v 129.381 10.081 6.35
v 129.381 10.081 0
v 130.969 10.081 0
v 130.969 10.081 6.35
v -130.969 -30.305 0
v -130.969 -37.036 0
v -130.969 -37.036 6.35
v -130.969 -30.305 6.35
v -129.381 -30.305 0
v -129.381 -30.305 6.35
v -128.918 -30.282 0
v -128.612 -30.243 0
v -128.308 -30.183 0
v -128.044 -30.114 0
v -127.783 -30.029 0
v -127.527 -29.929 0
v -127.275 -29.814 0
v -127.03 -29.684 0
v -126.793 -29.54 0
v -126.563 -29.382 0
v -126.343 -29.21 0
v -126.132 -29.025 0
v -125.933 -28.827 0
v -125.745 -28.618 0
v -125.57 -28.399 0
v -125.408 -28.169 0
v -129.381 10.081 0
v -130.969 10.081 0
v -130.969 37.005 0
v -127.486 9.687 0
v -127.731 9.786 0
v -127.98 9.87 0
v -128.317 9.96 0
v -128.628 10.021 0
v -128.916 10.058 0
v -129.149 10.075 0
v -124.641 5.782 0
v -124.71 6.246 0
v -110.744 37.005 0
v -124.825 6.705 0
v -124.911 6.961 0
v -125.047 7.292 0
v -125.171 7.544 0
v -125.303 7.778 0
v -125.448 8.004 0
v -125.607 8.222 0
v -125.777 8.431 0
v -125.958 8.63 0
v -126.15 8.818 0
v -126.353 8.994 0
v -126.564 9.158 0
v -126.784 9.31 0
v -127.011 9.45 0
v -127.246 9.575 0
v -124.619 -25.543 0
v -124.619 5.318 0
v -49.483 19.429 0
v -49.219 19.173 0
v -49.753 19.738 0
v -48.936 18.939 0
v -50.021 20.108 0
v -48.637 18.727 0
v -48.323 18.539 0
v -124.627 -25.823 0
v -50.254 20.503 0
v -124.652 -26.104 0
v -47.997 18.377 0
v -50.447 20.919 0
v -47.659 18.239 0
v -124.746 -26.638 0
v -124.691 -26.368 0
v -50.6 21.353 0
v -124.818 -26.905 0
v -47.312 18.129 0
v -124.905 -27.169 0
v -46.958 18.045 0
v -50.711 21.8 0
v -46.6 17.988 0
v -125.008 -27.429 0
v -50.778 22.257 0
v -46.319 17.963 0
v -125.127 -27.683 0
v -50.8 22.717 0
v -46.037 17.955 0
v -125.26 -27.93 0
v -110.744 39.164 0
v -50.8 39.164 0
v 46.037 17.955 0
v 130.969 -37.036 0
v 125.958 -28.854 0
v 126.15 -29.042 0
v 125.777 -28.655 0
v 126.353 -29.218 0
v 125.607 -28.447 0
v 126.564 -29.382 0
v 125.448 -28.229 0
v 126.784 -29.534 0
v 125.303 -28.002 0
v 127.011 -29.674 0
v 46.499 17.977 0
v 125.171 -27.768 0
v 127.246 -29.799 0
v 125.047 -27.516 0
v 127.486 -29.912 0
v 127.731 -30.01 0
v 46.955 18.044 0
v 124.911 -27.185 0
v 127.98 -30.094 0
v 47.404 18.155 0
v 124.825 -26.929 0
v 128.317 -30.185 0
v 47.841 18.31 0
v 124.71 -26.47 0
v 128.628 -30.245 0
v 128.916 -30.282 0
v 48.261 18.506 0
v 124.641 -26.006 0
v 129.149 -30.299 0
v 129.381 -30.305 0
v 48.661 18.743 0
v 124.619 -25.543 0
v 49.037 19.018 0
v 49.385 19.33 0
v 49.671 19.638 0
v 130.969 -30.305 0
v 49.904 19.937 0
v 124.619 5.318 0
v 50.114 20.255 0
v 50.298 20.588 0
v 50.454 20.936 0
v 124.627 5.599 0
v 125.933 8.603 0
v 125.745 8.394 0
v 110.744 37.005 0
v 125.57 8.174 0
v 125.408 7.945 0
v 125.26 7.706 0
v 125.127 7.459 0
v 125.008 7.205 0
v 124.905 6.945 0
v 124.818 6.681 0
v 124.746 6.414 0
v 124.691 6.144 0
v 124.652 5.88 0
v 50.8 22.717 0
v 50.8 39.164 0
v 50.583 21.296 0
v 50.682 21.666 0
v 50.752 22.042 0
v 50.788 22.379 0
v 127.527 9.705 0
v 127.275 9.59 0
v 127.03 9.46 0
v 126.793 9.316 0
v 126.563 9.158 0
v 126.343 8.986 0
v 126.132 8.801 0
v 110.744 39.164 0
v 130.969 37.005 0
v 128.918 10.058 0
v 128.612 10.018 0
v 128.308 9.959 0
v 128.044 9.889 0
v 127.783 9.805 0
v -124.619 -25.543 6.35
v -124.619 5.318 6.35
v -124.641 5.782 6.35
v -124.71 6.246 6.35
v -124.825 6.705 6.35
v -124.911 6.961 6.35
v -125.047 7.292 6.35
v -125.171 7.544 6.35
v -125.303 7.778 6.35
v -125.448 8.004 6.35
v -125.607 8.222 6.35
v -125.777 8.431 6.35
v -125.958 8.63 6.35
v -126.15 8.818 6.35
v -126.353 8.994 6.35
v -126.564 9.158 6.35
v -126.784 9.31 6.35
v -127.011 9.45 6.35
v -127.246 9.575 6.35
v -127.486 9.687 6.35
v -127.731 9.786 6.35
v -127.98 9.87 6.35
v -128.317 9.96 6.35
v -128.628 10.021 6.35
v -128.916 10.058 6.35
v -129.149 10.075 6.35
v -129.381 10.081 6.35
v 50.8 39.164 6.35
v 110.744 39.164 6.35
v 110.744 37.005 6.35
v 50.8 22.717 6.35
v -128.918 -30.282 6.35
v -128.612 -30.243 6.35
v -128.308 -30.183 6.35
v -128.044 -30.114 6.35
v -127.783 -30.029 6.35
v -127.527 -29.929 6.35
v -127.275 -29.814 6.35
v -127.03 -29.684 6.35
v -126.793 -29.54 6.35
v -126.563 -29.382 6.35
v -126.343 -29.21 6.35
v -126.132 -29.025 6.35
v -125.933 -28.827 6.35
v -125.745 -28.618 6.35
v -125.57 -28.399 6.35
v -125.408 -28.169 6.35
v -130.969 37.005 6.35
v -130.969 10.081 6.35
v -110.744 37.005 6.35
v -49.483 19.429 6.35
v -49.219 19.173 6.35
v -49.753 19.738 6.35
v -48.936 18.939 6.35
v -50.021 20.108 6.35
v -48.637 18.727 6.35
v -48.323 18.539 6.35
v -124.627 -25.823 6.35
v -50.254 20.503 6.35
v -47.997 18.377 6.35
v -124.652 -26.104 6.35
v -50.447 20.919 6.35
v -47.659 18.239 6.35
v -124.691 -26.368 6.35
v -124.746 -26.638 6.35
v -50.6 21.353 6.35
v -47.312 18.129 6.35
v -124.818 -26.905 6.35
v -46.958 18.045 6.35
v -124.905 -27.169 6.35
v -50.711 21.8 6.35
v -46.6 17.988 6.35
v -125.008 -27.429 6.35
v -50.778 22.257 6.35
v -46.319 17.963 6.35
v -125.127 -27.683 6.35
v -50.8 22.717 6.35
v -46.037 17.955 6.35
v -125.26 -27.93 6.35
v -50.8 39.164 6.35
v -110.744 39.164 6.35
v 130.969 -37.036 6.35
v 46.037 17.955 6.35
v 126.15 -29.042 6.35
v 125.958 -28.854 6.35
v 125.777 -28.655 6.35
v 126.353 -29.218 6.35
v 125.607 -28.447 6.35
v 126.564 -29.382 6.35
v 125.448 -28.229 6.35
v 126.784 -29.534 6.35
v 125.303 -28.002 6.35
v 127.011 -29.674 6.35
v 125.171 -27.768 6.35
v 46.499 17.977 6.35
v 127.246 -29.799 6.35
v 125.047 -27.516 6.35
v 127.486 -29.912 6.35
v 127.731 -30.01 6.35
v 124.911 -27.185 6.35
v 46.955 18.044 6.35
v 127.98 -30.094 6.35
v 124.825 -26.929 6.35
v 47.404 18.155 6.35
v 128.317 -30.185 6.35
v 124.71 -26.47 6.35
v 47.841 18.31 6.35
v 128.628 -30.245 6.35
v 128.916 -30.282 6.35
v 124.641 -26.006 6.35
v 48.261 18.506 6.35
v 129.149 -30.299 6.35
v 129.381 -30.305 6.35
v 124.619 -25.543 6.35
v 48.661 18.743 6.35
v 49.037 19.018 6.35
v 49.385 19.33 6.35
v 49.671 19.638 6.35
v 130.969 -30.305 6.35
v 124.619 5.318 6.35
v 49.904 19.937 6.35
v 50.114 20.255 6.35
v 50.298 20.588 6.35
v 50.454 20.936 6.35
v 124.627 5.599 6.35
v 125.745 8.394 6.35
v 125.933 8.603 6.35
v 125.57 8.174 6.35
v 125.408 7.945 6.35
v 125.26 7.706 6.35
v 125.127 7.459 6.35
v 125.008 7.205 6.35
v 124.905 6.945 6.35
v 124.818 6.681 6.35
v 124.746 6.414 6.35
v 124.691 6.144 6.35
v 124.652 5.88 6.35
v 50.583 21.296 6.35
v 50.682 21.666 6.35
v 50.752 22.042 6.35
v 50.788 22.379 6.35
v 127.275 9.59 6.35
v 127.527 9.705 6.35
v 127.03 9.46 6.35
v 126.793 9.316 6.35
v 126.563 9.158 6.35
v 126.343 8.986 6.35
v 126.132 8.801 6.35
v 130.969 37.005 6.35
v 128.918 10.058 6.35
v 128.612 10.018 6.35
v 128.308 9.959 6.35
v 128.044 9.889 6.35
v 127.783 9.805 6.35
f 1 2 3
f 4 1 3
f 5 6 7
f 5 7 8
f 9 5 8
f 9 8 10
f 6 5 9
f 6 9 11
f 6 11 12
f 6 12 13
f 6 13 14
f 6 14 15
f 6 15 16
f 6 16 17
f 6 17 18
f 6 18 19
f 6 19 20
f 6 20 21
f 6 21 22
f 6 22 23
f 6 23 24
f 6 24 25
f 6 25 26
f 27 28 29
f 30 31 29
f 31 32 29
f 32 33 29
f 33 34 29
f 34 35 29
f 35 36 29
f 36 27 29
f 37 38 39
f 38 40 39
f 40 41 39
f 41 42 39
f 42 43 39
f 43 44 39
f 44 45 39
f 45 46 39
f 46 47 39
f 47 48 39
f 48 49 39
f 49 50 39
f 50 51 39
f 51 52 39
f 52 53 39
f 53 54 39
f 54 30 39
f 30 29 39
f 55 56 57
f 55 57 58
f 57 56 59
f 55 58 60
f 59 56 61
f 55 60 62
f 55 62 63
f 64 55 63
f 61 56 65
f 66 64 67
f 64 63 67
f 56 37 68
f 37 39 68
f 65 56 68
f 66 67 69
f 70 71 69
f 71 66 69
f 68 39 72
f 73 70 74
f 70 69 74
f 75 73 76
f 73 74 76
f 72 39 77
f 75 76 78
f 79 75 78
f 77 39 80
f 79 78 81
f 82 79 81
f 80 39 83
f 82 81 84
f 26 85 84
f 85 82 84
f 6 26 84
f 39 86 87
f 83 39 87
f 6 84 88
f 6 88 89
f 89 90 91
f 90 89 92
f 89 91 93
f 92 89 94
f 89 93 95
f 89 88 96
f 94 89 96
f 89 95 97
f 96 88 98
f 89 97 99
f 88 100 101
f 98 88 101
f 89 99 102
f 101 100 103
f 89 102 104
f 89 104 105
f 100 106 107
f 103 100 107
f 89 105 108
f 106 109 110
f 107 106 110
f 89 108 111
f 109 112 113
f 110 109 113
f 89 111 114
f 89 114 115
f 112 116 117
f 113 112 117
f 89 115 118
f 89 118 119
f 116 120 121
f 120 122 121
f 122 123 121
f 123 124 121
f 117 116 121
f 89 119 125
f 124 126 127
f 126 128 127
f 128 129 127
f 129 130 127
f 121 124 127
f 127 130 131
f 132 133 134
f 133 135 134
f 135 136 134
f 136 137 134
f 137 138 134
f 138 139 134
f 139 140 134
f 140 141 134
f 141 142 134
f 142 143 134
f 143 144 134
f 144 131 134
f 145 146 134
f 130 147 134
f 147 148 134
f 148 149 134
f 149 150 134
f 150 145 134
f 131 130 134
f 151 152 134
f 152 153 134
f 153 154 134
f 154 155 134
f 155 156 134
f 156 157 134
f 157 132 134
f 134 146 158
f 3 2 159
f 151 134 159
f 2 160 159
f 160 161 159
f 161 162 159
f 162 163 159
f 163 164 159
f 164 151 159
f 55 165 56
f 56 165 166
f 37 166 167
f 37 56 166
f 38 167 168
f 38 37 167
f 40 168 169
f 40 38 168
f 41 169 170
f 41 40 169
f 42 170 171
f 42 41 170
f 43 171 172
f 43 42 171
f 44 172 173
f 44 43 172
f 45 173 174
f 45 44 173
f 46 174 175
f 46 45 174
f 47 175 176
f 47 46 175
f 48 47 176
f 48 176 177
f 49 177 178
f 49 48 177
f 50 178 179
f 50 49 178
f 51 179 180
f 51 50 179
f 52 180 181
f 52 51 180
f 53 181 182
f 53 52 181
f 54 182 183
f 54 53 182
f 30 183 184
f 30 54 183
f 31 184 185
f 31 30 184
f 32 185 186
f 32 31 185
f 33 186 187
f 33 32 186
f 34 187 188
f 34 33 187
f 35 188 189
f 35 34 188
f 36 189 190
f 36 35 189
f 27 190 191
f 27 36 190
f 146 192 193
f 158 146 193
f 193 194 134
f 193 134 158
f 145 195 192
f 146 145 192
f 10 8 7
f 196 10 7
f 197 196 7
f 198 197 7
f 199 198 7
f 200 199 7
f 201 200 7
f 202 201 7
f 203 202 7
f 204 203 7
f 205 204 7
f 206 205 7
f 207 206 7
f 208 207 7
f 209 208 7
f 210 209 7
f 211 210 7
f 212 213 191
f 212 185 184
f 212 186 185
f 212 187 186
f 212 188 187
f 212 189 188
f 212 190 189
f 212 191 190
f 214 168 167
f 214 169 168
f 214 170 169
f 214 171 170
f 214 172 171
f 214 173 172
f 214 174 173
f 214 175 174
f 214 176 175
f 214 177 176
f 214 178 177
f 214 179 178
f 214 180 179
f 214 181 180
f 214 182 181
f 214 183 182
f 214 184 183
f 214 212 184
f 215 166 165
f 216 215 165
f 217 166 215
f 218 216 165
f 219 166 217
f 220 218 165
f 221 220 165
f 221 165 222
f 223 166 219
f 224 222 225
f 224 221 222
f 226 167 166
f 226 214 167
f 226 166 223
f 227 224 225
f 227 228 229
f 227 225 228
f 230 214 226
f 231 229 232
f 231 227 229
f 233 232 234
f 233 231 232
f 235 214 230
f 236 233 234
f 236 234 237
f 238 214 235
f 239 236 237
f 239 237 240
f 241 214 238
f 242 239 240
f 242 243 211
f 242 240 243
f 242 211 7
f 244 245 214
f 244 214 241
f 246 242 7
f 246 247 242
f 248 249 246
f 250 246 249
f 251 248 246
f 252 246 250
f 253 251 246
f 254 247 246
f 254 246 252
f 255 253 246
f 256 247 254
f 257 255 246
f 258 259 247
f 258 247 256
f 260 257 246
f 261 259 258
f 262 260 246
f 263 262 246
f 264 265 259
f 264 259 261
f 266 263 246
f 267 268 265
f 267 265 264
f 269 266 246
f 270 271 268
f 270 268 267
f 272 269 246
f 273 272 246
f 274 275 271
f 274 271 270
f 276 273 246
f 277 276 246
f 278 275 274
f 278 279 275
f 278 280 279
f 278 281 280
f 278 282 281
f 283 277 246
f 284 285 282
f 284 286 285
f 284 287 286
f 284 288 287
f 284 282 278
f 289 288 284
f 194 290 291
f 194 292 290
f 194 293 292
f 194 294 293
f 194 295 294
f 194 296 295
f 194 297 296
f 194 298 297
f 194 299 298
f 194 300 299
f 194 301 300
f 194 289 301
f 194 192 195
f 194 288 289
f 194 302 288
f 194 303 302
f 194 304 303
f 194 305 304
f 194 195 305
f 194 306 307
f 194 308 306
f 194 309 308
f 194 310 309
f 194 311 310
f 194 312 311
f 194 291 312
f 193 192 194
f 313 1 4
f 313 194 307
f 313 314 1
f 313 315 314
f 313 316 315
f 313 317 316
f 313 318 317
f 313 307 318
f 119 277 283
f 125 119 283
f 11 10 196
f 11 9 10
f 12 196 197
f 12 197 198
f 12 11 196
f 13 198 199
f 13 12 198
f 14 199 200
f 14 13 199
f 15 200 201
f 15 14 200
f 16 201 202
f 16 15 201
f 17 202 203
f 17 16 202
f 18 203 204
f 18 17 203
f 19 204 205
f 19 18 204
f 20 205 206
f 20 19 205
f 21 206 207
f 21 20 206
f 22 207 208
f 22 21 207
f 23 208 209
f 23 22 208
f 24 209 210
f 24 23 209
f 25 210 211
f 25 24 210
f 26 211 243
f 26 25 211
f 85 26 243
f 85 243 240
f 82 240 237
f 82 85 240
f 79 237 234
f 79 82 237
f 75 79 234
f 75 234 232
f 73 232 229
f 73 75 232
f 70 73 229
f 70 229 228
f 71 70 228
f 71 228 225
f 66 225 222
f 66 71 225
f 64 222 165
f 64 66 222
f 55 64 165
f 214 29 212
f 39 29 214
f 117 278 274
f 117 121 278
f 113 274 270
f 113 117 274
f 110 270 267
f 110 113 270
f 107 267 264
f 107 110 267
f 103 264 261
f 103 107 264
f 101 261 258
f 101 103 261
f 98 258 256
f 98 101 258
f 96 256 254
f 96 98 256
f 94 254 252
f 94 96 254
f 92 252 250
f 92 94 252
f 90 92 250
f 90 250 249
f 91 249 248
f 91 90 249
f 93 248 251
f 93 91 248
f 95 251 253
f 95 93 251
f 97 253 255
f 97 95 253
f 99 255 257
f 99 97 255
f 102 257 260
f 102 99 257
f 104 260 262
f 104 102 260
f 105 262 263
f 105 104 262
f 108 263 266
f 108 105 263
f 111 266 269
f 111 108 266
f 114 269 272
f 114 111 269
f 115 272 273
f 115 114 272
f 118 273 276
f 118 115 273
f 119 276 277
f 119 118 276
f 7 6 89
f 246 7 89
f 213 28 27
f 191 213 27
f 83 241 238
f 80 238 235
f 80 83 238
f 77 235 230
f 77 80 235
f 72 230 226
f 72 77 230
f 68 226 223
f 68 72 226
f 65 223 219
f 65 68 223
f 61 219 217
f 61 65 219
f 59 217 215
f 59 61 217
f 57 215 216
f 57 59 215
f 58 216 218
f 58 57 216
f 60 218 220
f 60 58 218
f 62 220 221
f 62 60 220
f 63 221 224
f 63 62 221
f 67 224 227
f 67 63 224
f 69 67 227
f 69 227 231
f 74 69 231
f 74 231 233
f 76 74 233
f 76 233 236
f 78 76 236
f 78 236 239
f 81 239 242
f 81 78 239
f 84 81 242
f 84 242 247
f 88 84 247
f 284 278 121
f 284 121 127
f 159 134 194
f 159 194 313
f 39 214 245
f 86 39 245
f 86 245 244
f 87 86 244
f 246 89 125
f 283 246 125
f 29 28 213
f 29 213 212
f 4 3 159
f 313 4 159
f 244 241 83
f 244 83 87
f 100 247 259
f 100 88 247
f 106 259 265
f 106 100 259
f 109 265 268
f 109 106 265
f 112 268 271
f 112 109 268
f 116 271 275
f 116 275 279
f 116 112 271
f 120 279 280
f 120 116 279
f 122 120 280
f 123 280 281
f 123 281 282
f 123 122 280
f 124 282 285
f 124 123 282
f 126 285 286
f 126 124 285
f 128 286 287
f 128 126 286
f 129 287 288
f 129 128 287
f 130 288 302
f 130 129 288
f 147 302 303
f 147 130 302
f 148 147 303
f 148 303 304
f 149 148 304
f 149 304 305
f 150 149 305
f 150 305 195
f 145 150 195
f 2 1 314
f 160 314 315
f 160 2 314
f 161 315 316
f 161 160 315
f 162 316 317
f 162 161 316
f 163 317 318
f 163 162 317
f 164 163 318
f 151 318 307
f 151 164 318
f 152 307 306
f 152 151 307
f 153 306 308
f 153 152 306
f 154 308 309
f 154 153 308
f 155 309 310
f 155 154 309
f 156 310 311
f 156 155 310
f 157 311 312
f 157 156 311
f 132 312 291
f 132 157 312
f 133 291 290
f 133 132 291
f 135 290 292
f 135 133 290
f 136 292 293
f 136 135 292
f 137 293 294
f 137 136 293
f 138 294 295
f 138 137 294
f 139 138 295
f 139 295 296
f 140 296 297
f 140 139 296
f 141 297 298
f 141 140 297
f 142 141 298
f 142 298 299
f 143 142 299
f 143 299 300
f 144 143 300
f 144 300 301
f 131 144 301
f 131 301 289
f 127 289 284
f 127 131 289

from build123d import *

# Parameters (mm, degrees)
SKETCH1_W           = 261.9375
SKETCH1_H           = 69.85
BOSS_EXTRUDE1_DEPTH = 6.35
SKETCH2_W           = 6.35
SKETCH2_H           = 38.1
CUT_EXTRUDE1_DEPTH  = 136.694110416
SCALE1_SCALE_X      = 1
SCALE1_SCALE_Y      = 1.06
SCALE1_SCALE_Z      = 1
SKETCH3_W           = 101.6
SKETCH3_H           = 19.05
CUT_EXTRUDE2_DEPTH  = 137.252717885
FILLET1_R           = 4.7625
SKETCH4_W           = 59.944
SKETCH4_H           = 2.159
BOSS_EXTRUDE2_DEPTH = 6.35


with BuildPart() as part:
    # Sketch1 → Boss-Extrude1 (new body)
    with BuildSketch(Plane.XY):
        Rectangle(SKETCH1_W, SKETCH1_H)
    extrude(amount=BOSS_EXTRUDE1_DEPTH)

    # Sketch2 → Cut-Extrude1 (cut, through all)
    with BuildSketch(Plane.XY.offset(6.35)):
        with Locations((-127.79375, -9.525)):
            Rectangle(SKETCH2_W, SKETCH2_H)
        with Locations((127.79375, -9.525)):
            Rectangle(SKETCH2_W, SKETCH2_H)
    extrude(amount=-CUT_EXTRUDE1_DEPTH, mode=Mode.SUBTRACT)


with BuildPart() as part_1:
    # Scale1: scaled about (0, 0.258743633, 3.175)
    add(part.part.scale((SCALE1_SCALE_X, SCALE1_SCALE_Y, SCALE1_SCALE_Z), about=(0, 0.258743633, 3.175)))

    # Sketch3 → Cut-Extrude2 (cut, through all)
    with BuildSketch(Plane.XY.offset(6.35)):
        with Locations((0, 27.479975382)):
            Rectangle(SKETCH3_W, SKETCH3_H)
    extrude(amount=-CUT_EXTRUDE2_DEPTH, mode=Mode.SUBTRACT)

    # Fillet1
    fillet1_edges = [part_1.edges().sort_by_distance(p)[0] for p in [
        (-124.61875, 10.080975382, 3.175),
        (-124.61875, -30.305024618, 3.175),
        (124.61875, -30.305024618, 3.175),
        (124.61875, 10.080975382, 3.175),
        (-50.8, 17.954975382, 3.175),
        (50.8, 17.954975382, 3.175),
    ]]
    fillet(fillet1_edges, radius=FILLET1_R)

    # Sketch4 → Boss-Extrude2 (add)
    with BuildSketch(Plane.XY.offset(6.35)):
        with Locations((-80.772, 38.084475382)):
            Rectangle(SKETCH4_W, SKETCH4_H)
        with Locations((80.772, 38.084475382)):
            Rectangle(SKETCH4_W, SKETCH4_H)
    extrude(amount=-BOSS_EXTRUDE2_DEPTH)


solid = part_1.part
